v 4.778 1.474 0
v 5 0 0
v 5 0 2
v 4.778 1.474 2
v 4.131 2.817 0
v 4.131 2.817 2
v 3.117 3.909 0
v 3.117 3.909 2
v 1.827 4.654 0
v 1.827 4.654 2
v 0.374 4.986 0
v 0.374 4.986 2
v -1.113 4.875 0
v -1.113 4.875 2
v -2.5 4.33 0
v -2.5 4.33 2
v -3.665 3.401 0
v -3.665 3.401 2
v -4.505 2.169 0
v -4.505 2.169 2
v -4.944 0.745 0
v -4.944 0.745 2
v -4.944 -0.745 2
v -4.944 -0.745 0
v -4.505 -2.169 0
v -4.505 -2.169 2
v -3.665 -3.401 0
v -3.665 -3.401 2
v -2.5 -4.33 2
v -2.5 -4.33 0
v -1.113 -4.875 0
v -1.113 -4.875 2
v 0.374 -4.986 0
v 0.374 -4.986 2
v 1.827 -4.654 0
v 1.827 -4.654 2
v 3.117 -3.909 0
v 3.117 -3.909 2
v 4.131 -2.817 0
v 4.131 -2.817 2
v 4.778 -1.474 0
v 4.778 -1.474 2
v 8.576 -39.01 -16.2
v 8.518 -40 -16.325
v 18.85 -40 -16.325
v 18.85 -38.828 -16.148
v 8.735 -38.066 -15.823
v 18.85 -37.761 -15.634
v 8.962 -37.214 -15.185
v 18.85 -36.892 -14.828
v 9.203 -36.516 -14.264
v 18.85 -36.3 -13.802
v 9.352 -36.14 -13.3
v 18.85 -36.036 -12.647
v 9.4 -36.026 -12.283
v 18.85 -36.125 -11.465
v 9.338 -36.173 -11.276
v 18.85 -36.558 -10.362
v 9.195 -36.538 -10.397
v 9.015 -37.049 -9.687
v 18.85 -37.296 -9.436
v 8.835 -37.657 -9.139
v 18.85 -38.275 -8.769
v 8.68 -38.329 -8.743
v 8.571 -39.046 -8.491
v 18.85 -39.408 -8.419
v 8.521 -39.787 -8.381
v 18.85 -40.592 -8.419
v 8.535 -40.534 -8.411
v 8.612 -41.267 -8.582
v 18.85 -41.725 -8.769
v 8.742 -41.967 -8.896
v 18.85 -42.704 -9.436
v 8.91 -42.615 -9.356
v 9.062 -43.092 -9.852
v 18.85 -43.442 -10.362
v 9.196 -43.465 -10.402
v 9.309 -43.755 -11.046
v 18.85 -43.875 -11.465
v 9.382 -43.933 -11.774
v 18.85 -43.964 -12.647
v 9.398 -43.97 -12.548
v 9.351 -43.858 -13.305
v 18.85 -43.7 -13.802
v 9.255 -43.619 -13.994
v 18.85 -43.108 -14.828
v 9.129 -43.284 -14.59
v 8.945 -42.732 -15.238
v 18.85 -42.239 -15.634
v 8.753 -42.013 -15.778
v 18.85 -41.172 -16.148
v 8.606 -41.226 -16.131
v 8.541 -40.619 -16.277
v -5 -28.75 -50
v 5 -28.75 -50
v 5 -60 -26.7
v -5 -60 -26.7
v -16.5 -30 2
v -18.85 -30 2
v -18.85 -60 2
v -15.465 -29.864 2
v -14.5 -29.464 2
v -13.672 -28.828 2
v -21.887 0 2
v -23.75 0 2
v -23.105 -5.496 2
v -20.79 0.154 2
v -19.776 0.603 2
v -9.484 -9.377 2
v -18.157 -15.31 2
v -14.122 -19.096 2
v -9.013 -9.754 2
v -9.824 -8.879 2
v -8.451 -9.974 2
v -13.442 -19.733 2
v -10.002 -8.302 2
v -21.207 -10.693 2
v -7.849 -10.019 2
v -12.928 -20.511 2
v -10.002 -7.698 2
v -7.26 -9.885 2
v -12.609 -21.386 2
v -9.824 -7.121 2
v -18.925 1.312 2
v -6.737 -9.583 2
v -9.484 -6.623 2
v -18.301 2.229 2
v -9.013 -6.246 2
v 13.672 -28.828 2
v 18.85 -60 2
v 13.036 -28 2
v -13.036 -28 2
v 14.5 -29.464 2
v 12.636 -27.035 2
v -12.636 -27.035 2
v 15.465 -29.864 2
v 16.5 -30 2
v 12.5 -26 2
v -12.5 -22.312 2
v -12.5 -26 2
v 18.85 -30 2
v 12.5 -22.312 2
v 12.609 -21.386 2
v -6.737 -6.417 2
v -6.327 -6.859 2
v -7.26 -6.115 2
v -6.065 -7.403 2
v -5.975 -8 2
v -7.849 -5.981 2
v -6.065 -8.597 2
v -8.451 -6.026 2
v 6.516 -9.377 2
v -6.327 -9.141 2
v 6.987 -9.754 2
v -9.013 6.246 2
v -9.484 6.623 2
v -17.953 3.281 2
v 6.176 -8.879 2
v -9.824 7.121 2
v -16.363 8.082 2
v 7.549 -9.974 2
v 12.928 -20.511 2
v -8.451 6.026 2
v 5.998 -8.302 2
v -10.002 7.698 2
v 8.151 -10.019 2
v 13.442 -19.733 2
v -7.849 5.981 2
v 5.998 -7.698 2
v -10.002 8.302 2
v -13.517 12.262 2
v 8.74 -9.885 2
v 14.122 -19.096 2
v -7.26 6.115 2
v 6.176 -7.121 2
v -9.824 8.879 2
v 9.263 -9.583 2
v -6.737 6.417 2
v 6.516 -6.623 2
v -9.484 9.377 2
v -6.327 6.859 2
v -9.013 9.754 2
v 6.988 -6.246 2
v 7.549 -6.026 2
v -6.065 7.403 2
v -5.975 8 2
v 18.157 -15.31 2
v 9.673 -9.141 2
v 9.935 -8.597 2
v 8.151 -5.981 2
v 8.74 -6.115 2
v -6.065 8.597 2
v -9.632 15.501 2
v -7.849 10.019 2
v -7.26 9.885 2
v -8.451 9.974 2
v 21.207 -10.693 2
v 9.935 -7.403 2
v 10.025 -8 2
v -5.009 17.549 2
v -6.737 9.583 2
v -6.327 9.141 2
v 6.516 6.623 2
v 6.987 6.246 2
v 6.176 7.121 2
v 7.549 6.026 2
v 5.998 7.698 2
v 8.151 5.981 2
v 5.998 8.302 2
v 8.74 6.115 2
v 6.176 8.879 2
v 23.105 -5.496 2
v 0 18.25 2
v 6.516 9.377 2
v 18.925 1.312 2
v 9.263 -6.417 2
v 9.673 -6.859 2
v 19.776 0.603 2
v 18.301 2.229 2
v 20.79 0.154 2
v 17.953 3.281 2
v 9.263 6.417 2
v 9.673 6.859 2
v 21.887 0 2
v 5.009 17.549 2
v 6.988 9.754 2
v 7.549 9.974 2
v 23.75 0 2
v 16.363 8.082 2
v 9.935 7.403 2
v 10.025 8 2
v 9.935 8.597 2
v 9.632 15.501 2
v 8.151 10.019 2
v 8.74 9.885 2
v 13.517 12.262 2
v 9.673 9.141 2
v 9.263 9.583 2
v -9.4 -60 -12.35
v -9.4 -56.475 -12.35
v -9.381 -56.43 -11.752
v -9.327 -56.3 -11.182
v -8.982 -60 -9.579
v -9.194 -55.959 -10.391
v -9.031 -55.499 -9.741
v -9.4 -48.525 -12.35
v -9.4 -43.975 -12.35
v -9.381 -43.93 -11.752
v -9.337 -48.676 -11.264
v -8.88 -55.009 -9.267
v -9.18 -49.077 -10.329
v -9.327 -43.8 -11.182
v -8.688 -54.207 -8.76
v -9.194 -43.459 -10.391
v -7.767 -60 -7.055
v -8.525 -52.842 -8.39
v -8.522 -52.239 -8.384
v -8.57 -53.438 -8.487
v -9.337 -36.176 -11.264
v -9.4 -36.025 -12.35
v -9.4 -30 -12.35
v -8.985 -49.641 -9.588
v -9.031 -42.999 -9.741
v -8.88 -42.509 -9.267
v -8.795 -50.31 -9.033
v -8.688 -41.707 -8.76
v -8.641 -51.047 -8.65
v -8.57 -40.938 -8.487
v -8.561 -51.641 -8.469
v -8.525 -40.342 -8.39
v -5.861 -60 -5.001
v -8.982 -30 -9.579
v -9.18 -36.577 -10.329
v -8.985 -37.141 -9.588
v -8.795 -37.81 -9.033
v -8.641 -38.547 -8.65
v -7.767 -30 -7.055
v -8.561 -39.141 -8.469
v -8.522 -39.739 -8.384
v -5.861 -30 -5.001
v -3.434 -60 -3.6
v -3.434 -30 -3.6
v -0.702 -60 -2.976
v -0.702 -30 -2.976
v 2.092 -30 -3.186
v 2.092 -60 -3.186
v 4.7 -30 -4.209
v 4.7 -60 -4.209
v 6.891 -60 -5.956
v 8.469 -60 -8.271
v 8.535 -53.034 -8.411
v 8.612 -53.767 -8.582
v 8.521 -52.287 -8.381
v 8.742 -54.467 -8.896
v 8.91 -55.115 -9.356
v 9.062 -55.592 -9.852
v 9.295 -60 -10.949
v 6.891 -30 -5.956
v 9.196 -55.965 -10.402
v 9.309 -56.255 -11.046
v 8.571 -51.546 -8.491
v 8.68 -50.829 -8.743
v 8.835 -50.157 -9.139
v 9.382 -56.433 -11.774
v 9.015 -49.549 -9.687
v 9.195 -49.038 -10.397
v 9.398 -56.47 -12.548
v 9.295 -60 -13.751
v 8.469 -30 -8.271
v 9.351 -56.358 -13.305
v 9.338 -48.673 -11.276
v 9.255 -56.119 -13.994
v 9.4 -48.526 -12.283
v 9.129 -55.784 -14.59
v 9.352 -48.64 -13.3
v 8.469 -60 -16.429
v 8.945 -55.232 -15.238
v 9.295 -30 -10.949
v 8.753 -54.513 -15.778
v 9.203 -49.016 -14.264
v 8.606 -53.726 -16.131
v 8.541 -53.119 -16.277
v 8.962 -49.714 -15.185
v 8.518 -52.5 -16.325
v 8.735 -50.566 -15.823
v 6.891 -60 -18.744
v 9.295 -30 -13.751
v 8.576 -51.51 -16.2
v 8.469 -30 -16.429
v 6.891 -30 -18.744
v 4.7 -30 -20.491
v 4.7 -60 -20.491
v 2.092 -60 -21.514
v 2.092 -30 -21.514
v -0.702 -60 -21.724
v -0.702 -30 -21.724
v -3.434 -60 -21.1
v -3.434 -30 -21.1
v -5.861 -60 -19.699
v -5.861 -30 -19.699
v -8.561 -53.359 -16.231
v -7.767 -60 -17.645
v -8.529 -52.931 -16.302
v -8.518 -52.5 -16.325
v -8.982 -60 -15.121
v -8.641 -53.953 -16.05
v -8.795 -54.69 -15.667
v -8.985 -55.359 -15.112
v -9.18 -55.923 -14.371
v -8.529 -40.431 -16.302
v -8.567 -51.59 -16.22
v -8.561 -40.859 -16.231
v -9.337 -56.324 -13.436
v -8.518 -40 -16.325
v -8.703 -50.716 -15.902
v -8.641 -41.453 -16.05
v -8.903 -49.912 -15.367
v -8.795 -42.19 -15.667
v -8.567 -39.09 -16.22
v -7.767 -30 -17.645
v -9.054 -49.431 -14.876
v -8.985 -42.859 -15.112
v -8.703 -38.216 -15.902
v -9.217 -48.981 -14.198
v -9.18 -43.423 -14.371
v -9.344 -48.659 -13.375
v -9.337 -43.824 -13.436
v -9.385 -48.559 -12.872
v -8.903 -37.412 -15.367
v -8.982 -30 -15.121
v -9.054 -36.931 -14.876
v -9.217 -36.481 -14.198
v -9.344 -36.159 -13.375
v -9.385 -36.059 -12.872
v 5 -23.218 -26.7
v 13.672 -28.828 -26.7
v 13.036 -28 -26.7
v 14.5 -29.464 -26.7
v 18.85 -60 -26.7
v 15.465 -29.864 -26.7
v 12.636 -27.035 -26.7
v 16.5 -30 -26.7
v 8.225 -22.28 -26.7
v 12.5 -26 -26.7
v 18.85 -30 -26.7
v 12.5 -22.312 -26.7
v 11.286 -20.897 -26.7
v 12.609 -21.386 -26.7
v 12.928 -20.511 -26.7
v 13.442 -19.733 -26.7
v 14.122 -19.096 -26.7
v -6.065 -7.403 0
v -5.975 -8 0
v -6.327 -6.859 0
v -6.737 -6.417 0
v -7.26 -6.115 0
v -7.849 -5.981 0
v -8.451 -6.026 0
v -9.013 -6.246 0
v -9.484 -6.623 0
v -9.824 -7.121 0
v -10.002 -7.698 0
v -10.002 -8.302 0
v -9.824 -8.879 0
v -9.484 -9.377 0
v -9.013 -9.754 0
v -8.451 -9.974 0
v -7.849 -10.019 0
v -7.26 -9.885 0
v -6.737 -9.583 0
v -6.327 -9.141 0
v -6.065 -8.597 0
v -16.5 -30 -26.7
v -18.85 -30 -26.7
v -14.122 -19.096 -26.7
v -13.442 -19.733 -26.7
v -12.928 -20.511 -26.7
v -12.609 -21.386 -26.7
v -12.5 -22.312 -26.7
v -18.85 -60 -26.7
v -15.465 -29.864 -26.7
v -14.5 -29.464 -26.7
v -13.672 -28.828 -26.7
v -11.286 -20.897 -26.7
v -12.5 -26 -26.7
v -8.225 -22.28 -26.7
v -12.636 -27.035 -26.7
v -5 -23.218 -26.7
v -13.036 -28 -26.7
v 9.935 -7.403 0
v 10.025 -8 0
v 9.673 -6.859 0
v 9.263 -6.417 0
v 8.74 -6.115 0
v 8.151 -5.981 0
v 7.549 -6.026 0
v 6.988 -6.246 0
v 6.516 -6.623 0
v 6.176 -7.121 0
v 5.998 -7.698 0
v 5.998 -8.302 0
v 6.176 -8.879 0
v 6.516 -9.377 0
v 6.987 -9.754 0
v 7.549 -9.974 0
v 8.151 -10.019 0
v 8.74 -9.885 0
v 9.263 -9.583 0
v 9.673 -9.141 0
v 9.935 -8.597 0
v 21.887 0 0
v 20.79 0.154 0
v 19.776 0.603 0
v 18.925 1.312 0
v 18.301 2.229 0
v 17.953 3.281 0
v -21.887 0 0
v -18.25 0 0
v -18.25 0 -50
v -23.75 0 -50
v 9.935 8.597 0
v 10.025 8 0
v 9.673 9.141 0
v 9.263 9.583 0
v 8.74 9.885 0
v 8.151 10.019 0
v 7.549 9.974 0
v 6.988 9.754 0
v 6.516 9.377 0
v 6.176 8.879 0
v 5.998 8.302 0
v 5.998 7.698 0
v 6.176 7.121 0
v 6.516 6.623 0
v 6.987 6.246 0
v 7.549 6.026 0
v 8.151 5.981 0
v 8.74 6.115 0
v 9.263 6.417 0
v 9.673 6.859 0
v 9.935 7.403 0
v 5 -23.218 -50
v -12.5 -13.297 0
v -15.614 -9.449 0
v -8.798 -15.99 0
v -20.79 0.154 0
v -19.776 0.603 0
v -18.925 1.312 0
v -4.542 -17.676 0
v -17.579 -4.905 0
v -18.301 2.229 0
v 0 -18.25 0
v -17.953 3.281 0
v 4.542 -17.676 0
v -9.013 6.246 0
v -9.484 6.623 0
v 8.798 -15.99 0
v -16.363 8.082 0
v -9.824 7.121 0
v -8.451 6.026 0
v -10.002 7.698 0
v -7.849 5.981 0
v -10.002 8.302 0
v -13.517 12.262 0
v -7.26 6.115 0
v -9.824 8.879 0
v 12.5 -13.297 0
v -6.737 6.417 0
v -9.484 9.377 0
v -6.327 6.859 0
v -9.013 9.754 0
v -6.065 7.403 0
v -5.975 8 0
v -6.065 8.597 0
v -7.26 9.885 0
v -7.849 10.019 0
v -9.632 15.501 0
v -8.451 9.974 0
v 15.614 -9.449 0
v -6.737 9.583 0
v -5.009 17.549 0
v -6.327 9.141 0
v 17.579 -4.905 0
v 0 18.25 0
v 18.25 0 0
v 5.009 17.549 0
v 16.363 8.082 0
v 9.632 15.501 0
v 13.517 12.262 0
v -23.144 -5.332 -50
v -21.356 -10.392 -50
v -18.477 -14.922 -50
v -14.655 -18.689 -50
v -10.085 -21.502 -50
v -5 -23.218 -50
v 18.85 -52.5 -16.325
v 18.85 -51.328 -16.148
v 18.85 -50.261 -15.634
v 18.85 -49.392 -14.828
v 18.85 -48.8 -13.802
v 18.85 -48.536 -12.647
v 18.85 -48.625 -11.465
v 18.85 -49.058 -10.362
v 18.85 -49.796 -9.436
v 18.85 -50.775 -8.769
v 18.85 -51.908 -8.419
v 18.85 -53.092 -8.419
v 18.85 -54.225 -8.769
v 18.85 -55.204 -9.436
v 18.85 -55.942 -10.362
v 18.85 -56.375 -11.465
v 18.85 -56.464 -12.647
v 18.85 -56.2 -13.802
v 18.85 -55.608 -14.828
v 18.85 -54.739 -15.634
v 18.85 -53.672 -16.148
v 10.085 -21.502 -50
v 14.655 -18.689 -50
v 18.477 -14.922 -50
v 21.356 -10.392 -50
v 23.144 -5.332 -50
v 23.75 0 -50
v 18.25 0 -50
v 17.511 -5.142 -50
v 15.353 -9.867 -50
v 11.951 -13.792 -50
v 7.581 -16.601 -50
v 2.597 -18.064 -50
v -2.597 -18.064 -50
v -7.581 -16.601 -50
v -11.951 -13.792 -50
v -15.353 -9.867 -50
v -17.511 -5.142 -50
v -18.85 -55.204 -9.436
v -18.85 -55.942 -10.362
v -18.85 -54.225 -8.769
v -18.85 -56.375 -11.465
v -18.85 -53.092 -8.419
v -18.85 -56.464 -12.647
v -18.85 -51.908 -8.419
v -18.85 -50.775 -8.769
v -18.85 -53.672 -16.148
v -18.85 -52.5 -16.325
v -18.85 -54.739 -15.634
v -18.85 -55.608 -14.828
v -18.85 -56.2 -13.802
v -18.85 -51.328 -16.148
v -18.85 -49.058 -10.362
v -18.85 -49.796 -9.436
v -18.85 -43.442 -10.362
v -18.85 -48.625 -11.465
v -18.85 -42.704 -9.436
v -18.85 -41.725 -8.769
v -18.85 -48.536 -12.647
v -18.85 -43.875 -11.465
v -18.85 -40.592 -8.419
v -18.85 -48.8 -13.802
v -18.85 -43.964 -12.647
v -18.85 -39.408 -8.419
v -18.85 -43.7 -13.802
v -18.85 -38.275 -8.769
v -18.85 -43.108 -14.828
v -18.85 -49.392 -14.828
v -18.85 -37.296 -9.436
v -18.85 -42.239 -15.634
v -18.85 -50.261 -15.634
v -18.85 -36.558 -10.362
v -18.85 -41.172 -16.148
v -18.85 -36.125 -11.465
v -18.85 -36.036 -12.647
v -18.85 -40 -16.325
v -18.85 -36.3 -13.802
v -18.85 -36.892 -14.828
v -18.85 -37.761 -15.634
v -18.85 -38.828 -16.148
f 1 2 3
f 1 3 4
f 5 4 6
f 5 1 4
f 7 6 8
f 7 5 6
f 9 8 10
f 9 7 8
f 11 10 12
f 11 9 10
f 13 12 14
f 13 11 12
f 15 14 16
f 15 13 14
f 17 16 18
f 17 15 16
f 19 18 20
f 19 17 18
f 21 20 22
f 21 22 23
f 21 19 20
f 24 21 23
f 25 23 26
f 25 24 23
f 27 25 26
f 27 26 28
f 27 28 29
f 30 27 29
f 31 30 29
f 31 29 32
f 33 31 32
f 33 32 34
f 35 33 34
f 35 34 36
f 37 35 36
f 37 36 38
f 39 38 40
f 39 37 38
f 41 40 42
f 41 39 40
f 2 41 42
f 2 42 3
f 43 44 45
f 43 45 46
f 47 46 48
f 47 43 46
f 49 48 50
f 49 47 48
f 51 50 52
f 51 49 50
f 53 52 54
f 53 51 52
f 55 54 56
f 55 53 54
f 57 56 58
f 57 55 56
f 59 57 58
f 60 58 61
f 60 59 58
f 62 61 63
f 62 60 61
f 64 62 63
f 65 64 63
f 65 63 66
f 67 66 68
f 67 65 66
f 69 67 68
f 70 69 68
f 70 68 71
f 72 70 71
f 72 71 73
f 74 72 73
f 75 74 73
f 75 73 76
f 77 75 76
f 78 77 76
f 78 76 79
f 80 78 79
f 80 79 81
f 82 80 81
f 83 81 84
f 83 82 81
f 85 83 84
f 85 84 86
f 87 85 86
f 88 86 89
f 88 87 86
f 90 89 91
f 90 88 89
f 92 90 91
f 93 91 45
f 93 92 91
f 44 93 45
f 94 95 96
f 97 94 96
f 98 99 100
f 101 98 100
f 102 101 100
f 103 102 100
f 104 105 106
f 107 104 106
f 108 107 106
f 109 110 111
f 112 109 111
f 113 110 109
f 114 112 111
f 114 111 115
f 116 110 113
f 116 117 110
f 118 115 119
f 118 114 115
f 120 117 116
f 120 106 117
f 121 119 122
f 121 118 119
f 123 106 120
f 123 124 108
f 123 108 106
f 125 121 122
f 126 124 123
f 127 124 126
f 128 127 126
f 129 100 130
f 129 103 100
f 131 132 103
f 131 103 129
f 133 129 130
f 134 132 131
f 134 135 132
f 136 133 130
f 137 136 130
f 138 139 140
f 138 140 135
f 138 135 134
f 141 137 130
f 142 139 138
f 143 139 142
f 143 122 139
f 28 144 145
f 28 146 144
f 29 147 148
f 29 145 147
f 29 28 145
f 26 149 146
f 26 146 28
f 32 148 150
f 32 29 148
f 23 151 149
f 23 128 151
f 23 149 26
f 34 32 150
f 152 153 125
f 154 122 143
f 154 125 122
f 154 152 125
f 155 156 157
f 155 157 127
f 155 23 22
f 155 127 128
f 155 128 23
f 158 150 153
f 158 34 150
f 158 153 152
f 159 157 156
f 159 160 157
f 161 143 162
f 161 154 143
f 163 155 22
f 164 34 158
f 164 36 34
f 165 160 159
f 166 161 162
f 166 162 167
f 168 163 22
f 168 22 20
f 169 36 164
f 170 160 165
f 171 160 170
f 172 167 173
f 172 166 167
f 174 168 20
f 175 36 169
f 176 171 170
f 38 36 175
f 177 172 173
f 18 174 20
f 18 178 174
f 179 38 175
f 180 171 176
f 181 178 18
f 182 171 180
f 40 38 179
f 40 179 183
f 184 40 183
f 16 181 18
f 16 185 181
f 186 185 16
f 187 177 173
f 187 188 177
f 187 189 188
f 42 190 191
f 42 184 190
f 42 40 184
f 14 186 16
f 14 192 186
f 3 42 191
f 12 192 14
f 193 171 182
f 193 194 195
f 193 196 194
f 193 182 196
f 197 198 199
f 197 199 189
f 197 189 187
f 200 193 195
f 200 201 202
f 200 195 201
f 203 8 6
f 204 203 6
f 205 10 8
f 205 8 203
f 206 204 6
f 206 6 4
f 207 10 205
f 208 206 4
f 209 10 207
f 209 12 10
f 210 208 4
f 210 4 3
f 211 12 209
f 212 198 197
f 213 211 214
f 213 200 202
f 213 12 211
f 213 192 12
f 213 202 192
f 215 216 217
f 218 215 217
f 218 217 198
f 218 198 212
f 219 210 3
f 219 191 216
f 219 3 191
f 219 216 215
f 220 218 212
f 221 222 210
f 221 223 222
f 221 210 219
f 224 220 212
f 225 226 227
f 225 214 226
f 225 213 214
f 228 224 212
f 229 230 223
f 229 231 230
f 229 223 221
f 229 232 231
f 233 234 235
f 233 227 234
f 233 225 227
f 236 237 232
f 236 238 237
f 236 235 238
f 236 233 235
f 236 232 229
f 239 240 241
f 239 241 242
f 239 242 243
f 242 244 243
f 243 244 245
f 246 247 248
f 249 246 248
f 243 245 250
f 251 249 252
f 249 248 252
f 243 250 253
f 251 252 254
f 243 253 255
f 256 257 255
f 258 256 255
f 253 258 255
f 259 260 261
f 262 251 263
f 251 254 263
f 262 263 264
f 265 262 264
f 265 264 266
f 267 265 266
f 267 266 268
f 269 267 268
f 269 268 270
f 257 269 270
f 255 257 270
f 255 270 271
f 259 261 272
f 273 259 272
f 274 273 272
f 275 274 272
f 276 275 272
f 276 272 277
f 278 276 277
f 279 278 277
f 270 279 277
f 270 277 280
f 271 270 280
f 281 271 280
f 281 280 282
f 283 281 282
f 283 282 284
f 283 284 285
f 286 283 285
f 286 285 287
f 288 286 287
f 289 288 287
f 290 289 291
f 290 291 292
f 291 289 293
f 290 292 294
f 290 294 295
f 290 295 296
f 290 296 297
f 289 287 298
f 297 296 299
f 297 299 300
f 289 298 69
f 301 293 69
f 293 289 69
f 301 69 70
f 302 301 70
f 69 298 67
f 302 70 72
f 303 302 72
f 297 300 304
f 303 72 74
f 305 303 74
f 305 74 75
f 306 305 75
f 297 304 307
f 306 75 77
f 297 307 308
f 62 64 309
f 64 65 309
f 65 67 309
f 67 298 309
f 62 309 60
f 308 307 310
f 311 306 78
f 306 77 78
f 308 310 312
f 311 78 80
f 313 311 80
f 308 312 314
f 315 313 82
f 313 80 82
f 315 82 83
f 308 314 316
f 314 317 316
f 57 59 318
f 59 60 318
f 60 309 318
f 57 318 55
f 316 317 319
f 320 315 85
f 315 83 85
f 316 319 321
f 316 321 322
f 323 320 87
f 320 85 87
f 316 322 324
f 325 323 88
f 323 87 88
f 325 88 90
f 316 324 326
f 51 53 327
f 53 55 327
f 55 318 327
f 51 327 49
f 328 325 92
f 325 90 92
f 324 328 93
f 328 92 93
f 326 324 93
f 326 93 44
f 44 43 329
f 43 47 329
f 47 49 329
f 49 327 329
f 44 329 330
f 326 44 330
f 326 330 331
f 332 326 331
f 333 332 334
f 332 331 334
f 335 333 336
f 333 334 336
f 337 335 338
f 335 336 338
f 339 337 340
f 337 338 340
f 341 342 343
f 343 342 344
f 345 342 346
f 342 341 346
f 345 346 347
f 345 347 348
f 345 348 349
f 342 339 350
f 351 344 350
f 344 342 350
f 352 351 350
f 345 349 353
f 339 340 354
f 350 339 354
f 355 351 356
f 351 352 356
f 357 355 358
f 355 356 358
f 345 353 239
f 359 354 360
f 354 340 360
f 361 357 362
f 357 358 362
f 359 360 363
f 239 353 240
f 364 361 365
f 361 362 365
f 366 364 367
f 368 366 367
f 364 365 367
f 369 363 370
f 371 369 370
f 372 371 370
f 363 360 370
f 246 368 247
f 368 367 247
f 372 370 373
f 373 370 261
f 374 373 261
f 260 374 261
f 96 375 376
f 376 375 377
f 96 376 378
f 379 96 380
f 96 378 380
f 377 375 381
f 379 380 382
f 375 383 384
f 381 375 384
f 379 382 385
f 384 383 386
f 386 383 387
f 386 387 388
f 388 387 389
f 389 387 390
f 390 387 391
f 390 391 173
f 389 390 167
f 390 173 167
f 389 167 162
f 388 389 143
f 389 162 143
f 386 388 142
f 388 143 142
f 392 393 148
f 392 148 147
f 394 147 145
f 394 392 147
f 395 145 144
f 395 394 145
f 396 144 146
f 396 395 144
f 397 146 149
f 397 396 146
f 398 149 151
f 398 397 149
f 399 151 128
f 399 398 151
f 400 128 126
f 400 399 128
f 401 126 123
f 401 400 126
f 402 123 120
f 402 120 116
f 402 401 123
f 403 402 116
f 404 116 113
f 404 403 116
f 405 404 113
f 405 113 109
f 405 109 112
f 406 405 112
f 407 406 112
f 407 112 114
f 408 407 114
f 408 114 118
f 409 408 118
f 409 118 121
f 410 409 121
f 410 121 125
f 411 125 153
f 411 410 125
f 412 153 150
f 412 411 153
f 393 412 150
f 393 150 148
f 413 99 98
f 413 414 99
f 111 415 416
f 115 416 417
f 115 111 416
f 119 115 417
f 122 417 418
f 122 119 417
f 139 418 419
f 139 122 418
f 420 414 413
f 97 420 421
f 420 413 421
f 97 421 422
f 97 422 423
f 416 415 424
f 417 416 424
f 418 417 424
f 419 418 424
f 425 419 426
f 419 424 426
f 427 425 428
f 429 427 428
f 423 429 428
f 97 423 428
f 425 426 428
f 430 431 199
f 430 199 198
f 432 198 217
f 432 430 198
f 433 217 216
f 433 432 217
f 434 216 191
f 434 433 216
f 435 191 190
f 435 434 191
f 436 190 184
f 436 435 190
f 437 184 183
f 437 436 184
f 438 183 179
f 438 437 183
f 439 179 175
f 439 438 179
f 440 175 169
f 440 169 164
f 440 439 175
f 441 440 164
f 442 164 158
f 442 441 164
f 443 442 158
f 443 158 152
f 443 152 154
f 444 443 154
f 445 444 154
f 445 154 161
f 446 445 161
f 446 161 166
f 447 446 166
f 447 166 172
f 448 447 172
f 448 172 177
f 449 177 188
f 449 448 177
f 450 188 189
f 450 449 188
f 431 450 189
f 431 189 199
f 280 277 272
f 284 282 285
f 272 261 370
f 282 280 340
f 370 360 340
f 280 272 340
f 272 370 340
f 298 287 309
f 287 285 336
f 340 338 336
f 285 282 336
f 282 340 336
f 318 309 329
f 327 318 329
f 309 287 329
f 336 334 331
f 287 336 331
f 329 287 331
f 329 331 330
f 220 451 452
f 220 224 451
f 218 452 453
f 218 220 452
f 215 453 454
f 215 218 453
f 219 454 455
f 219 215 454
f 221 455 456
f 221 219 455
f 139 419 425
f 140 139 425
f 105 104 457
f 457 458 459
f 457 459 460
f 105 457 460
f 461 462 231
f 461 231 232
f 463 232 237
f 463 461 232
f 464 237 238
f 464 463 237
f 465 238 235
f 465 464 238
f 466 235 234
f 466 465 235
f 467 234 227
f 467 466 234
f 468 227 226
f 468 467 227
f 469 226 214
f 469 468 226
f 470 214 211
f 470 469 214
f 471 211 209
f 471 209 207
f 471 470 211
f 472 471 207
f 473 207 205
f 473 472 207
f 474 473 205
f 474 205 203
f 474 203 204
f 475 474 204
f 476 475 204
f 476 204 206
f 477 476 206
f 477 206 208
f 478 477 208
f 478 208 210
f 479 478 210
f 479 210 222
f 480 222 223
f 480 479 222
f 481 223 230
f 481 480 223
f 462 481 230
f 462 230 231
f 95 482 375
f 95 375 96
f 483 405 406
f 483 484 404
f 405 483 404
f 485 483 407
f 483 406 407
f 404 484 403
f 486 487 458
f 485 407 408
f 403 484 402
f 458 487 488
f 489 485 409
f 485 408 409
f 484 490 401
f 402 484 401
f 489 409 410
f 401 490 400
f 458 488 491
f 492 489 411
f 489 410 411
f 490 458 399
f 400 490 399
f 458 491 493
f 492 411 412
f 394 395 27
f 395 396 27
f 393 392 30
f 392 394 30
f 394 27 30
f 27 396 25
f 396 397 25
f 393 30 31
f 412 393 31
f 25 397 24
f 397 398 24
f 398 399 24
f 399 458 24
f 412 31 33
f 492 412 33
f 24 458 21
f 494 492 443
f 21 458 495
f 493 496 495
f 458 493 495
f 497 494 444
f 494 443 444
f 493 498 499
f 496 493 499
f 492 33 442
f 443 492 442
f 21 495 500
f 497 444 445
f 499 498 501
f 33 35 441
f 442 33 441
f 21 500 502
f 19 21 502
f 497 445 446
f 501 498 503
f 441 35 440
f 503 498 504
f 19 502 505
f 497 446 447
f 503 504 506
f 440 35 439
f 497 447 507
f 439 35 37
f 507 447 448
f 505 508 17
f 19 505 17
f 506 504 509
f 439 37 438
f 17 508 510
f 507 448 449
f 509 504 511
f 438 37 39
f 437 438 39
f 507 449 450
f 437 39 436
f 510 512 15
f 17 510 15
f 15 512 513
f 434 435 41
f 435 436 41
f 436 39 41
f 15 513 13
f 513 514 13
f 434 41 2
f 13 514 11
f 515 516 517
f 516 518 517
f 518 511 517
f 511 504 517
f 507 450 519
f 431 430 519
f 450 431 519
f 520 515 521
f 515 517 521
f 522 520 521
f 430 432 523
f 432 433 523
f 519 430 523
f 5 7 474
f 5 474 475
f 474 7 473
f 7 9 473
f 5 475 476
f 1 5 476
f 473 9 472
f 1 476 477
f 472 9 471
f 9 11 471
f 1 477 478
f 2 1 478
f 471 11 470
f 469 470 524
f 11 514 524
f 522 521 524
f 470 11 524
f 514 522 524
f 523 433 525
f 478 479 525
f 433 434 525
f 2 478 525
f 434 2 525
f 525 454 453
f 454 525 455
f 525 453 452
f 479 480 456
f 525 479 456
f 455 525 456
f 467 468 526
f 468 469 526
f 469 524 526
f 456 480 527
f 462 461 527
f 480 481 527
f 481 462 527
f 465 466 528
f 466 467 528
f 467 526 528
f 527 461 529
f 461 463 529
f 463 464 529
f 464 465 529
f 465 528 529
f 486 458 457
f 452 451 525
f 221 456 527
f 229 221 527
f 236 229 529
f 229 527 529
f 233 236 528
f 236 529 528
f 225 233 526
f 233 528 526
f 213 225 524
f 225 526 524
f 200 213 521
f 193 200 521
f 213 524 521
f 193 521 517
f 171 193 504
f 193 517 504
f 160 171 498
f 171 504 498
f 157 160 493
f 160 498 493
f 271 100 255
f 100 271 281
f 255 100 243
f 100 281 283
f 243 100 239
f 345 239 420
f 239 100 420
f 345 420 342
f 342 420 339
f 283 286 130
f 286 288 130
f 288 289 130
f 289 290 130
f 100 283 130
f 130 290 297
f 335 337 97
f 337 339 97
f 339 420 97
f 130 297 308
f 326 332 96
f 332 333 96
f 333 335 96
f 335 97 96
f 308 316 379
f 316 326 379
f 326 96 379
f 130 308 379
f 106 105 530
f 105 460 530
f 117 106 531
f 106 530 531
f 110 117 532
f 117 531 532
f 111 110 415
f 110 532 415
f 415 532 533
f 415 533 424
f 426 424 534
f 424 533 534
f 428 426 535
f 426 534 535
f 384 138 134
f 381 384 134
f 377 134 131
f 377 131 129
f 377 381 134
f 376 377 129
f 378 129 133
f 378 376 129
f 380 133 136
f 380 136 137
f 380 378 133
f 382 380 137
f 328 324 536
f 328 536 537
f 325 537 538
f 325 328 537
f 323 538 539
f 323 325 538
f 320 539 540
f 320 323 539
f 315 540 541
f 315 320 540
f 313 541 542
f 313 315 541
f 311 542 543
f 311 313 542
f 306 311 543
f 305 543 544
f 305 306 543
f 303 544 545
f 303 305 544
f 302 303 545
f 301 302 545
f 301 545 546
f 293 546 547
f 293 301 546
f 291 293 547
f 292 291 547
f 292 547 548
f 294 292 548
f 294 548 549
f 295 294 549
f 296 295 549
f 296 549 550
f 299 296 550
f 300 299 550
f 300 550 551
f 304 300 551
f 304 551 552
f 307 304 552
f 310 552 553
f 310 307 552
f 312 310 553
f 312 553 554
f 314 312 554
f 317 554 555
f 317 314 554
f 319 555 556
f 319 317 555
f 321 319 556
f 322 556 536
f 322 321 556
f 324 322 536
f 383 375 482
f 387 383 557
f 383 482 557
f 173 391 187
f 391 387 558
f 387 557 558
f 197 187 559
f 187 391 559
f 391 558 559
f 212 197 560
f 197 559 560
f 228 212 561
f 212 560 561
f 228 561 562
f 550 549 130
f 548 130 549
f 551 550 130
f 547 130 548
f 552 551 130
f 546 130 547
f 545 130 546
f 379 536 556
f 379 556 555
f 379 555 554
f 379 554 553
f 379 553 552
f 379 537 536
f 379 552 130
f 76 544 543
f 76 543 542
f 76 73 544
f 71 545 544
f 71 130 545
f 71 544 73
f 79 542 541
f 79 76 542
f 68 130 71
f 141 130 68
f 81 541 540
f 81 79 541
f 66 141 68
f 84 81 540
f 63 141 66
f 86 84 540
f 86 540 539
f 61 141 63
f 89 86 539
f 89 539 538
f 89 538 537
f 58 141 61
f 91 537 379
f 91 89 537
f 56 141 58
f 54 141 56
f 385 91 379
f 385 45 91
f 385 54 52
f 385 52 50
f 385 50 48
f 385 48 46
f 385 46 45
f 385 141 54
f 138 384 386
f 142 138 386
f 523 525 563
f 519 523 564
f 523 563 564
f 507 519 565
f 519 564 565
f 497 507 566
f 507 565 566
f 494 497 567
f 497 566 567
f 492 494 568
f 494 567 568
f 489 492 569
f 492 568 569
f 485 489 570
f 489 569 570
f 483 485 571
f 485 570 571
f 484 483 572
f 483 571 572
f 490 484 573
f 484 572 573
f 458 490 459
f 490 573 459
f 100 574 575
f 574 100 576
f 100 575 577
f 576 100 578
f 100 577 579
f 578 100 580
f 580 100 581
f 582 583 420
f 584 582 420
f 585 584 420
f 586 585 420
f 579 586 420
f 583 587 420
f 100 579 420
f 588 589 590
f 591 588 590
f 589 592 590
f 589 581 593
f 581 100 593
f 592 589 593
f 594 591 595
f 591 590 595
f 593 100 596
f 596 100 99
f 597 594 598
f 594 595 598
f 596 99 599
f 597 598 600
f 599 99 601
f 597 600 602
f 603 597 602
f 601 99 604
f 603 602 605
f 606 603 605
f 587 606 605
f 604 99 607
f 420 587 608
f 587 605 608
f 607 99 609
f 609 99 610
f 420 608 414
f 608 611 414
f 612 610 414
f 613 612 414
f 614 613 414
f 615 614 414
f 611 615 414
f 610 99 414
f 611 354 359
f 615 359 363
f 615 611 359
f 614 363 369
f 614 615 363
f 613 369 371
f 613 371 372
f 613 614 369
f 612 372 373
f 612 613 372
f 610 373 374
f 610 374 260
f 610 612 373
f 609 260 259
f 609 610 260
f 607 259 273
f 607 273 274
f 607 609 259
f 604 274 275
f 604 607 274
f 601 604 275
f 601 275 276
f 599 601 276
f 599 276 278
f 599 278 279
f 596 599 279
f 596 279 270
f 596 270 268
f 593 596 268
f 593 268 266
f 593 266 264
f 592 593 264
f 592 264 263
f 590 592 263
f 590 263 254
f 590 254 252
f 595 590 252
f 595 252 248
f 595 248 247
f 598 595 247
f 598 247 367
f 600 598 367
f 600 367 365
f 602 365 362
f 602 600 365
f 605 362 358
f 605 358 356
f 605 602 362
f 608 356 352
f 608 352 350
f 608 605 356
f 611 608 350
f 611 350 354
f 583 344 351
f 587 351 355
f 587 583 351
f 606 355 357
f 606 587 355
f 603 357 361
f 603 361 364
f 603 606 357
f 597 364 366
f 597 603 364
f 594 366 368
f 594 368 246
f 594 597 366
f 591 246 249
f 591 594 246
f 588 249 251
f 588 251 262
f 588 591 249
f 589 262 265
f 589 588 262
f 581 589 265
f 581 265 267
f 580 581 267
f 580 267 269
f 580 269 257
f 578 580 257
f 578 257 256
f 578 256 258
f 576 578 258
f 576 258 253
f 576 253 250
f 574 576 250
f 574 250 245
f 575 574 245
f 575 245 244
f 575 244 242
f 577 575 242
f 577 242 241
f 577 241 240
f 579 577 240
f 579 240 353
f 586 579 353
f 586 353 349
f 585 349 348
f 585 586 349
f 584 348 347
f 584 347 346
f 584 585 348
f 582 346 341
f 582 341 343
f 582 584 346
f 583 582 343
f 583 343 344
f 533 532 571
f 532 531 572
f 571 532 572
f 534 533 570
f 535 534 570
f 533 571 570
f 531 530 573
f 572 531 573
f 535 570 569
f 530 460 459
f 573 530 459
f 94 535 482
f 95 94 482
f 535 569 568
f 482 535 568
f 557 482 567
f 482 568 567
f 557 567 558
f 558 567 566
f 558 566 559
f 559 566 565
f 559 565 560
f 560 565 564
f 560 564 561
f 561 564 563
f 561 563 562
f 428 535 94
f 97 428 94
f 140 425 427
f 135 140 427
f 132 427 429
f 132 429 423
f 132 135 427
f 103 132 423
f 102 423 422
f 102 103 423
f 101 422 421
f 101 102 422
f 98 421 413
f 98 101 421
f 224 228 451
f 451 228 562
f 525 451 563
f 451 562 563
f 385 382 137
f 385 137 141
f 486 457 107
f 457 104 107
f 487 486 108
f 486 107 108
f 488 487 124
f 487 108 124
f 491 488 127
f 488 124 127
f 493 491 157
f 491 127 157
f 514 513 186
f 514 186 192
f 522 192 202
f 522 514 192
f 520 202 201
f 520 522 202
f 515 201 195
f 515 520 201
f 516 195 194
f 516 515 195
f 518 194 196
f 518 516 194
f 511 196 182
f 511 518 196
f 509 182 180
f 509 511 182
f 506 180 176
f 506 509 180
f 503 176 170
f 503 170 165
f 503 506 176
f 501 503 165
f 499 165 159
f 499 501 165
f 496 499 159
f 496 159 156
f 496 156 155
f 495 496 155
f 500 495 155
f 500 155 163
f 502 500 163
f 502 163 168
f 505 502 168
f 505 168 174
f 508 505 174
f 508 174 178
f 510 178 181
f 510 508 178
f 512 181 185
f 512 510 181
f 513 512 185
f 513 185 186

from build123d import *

# Parameters (mm, degrees)
SKETCH2_R               = 2.025
SKETCH2_R_2             = 5
BOSS_EXTRUDE3_DEPTH     = 2
BOSS_EXTRUDE4_START     = -50
BOSS_EXTRUDE4_DEPTH     = 52
BOSS_EXTRUDE6_START     = -30
SKETCH7_W               = 37.7
SKETCH7_H               = 28.7
SKETCH7_R               = 9.4
BOSS_EXTRUDE6_DEPTH     = 30
BOSS_EXTRUDE7_START     = -26.7
BOSS_EXTRUDE7_DEPTH     = 26.7
CUT_EXTRUDE1_DEPTH      = 82.633709336
CUT_EXTRUDE1_DEPTH_BACK = 82.633709336
SKETCH6_R               = 3.975
RIB3_START              = -5
RIB3_DEPTH              = 10
FILLET2_R               = 4


# Read off the part's stored shape, not the designer's step: Rib3
with BuildPart() as part:
    # Sketch2 → Boss-Extrude3 (new body)
    with BuildSketch(Plane.XY):
        with BuildLine():
            Line((12.5, -30), (12.5, -13.297086147))
            ThreePointArc((12.5, -13.297086147), (0, 18.25), (-12.5, -13.297086147))
            Line((-12.5, -13.297086147), (-12.5, -30))
            Line((-12.5, -30), (12.5, -30))
        make_face()
        with Locations((8, 8)):
            Circle(SKETCH2_R, mode=Mode.SUBTRACT)
        with Locations((-8, -8)):
            Circle(SKETCH2_R, mode=Mode.SUBTRACT)
        with Locations((-8, 8)):
            Circle(SKETCH2_R, mode=Mode.SUBTRACT)
        with Locations((8, -8)):
            Circle(SKETCH2_R, mode=Mode.SUBTRACT)
        Circle(SKETCH2_R_2, mode=Mode.SUBTRACT)
    extrude(amount=BOSS_EXTRUDE3_DEPTH)

    # Sketch3 → Boss-Extrude4 (add)
    with BuildSketch(Plane.XY.offset(BOSS_EXTRUDE4_START)):
        with BuildLine():
            Line((23.75, 0), (18.25, 0))
            ThreePointArc((18.25, 0), (0, -18.25), (-18.25, 0))
            Line((-18.25, 0), (-23.75, 0))
            ThreePointArc((-23.75, 0), (0, -23.75), (23.75, 0))
        make_face()
    extrude(amount=BOSS_EXTRUDE4_DEPTH)

    # Sketch7 → Boss-Extrude6 (add)
    with BuildSketch(Plane(origin=(0, 0, 0), x_dir=(1, 0, 0), z_dir=(0, 1, 0)).offset(BOSS_EXTRUDE6_START)):
        with Locations((0, 12.35)):
            Rectangle(SKETCH7_W, SKETCH7_H)
        with Locations(Location((0, 12.35, 0), (0, 0, 180))):
            Circle(SKETCH7_R, mode=Mode.SUBTRACT)
    extrude(amount=-BOSS_EXTRUDE6_DEPTH)

    # Sketch2<8> → Boss-Extrude7 (add)
    with BuildSketch(Plane.XY.offset(BOSS_EXTRUDE7_START)):
        with BuildLine():
            Line((12.5, -30), (12.5, -13.297086147))
            ThreePointArc((12.5, -13.297086147), (0, -18.25), (-12.5, -13.297086147))
            Line((-12.5, -13.297086147), (-12.5, -30))
            Line((-12.5, -30), (12.5, -30))
        make_face()
    extrude(amount=BOSS_EXTRUDE7_DEPTH)

    # Sketch6 → Cut-Extrude1 (cut, two sides: drawn at the far end of the back side and taken through both)
    with BuildSketch(Plane(origin=(0, 0, 0), x_dir=(0, 0, -1), z_dir=(1, 0, 0)).offset(-CUT_EXTRUDE1_DEPTH_BACK)):
        with Locations((12.35, -40)):
            Circle(SKETCH6_R)
        with Locations((12.35, -52.5)):
            Circle(SKETCH6_R)
    extrude(amount=CUT_EXTRUDE1_DEPTH + CUT_EXTRUDE1_DEPTH_BACK, mode=Mode.SUBTRACT)

    # Rib3 outline → Rib3 (add)
    with BuildSketch(Plane(origin=(0, -60, 0), x_dir=(0, -1, 0), z_dir=(-1, 0, 0)).offset(RIB3_START)):
        Polygon((-38, -50), (-31.25, -50), (0, -26.7), (-38, -26.7), align=None)
    extrude(amount=RIB3_DEPTH)

    # Fillet2
    fillet2_edges = [part.edges().sort_by_distance(p)[0] for p in [
        (12.5, -30, -12.35),
        (-12.5, -30, -12.35),
        (-18.25, 0, 1),
        (12.5, -20.194368027, -12.35),
        (18.25, 0, 1),
        (-12.5, -20.194368027, -12.35),
    ]]
    fillet(fillet2_edges, radius=FILLET2_R)


solid = part.part
